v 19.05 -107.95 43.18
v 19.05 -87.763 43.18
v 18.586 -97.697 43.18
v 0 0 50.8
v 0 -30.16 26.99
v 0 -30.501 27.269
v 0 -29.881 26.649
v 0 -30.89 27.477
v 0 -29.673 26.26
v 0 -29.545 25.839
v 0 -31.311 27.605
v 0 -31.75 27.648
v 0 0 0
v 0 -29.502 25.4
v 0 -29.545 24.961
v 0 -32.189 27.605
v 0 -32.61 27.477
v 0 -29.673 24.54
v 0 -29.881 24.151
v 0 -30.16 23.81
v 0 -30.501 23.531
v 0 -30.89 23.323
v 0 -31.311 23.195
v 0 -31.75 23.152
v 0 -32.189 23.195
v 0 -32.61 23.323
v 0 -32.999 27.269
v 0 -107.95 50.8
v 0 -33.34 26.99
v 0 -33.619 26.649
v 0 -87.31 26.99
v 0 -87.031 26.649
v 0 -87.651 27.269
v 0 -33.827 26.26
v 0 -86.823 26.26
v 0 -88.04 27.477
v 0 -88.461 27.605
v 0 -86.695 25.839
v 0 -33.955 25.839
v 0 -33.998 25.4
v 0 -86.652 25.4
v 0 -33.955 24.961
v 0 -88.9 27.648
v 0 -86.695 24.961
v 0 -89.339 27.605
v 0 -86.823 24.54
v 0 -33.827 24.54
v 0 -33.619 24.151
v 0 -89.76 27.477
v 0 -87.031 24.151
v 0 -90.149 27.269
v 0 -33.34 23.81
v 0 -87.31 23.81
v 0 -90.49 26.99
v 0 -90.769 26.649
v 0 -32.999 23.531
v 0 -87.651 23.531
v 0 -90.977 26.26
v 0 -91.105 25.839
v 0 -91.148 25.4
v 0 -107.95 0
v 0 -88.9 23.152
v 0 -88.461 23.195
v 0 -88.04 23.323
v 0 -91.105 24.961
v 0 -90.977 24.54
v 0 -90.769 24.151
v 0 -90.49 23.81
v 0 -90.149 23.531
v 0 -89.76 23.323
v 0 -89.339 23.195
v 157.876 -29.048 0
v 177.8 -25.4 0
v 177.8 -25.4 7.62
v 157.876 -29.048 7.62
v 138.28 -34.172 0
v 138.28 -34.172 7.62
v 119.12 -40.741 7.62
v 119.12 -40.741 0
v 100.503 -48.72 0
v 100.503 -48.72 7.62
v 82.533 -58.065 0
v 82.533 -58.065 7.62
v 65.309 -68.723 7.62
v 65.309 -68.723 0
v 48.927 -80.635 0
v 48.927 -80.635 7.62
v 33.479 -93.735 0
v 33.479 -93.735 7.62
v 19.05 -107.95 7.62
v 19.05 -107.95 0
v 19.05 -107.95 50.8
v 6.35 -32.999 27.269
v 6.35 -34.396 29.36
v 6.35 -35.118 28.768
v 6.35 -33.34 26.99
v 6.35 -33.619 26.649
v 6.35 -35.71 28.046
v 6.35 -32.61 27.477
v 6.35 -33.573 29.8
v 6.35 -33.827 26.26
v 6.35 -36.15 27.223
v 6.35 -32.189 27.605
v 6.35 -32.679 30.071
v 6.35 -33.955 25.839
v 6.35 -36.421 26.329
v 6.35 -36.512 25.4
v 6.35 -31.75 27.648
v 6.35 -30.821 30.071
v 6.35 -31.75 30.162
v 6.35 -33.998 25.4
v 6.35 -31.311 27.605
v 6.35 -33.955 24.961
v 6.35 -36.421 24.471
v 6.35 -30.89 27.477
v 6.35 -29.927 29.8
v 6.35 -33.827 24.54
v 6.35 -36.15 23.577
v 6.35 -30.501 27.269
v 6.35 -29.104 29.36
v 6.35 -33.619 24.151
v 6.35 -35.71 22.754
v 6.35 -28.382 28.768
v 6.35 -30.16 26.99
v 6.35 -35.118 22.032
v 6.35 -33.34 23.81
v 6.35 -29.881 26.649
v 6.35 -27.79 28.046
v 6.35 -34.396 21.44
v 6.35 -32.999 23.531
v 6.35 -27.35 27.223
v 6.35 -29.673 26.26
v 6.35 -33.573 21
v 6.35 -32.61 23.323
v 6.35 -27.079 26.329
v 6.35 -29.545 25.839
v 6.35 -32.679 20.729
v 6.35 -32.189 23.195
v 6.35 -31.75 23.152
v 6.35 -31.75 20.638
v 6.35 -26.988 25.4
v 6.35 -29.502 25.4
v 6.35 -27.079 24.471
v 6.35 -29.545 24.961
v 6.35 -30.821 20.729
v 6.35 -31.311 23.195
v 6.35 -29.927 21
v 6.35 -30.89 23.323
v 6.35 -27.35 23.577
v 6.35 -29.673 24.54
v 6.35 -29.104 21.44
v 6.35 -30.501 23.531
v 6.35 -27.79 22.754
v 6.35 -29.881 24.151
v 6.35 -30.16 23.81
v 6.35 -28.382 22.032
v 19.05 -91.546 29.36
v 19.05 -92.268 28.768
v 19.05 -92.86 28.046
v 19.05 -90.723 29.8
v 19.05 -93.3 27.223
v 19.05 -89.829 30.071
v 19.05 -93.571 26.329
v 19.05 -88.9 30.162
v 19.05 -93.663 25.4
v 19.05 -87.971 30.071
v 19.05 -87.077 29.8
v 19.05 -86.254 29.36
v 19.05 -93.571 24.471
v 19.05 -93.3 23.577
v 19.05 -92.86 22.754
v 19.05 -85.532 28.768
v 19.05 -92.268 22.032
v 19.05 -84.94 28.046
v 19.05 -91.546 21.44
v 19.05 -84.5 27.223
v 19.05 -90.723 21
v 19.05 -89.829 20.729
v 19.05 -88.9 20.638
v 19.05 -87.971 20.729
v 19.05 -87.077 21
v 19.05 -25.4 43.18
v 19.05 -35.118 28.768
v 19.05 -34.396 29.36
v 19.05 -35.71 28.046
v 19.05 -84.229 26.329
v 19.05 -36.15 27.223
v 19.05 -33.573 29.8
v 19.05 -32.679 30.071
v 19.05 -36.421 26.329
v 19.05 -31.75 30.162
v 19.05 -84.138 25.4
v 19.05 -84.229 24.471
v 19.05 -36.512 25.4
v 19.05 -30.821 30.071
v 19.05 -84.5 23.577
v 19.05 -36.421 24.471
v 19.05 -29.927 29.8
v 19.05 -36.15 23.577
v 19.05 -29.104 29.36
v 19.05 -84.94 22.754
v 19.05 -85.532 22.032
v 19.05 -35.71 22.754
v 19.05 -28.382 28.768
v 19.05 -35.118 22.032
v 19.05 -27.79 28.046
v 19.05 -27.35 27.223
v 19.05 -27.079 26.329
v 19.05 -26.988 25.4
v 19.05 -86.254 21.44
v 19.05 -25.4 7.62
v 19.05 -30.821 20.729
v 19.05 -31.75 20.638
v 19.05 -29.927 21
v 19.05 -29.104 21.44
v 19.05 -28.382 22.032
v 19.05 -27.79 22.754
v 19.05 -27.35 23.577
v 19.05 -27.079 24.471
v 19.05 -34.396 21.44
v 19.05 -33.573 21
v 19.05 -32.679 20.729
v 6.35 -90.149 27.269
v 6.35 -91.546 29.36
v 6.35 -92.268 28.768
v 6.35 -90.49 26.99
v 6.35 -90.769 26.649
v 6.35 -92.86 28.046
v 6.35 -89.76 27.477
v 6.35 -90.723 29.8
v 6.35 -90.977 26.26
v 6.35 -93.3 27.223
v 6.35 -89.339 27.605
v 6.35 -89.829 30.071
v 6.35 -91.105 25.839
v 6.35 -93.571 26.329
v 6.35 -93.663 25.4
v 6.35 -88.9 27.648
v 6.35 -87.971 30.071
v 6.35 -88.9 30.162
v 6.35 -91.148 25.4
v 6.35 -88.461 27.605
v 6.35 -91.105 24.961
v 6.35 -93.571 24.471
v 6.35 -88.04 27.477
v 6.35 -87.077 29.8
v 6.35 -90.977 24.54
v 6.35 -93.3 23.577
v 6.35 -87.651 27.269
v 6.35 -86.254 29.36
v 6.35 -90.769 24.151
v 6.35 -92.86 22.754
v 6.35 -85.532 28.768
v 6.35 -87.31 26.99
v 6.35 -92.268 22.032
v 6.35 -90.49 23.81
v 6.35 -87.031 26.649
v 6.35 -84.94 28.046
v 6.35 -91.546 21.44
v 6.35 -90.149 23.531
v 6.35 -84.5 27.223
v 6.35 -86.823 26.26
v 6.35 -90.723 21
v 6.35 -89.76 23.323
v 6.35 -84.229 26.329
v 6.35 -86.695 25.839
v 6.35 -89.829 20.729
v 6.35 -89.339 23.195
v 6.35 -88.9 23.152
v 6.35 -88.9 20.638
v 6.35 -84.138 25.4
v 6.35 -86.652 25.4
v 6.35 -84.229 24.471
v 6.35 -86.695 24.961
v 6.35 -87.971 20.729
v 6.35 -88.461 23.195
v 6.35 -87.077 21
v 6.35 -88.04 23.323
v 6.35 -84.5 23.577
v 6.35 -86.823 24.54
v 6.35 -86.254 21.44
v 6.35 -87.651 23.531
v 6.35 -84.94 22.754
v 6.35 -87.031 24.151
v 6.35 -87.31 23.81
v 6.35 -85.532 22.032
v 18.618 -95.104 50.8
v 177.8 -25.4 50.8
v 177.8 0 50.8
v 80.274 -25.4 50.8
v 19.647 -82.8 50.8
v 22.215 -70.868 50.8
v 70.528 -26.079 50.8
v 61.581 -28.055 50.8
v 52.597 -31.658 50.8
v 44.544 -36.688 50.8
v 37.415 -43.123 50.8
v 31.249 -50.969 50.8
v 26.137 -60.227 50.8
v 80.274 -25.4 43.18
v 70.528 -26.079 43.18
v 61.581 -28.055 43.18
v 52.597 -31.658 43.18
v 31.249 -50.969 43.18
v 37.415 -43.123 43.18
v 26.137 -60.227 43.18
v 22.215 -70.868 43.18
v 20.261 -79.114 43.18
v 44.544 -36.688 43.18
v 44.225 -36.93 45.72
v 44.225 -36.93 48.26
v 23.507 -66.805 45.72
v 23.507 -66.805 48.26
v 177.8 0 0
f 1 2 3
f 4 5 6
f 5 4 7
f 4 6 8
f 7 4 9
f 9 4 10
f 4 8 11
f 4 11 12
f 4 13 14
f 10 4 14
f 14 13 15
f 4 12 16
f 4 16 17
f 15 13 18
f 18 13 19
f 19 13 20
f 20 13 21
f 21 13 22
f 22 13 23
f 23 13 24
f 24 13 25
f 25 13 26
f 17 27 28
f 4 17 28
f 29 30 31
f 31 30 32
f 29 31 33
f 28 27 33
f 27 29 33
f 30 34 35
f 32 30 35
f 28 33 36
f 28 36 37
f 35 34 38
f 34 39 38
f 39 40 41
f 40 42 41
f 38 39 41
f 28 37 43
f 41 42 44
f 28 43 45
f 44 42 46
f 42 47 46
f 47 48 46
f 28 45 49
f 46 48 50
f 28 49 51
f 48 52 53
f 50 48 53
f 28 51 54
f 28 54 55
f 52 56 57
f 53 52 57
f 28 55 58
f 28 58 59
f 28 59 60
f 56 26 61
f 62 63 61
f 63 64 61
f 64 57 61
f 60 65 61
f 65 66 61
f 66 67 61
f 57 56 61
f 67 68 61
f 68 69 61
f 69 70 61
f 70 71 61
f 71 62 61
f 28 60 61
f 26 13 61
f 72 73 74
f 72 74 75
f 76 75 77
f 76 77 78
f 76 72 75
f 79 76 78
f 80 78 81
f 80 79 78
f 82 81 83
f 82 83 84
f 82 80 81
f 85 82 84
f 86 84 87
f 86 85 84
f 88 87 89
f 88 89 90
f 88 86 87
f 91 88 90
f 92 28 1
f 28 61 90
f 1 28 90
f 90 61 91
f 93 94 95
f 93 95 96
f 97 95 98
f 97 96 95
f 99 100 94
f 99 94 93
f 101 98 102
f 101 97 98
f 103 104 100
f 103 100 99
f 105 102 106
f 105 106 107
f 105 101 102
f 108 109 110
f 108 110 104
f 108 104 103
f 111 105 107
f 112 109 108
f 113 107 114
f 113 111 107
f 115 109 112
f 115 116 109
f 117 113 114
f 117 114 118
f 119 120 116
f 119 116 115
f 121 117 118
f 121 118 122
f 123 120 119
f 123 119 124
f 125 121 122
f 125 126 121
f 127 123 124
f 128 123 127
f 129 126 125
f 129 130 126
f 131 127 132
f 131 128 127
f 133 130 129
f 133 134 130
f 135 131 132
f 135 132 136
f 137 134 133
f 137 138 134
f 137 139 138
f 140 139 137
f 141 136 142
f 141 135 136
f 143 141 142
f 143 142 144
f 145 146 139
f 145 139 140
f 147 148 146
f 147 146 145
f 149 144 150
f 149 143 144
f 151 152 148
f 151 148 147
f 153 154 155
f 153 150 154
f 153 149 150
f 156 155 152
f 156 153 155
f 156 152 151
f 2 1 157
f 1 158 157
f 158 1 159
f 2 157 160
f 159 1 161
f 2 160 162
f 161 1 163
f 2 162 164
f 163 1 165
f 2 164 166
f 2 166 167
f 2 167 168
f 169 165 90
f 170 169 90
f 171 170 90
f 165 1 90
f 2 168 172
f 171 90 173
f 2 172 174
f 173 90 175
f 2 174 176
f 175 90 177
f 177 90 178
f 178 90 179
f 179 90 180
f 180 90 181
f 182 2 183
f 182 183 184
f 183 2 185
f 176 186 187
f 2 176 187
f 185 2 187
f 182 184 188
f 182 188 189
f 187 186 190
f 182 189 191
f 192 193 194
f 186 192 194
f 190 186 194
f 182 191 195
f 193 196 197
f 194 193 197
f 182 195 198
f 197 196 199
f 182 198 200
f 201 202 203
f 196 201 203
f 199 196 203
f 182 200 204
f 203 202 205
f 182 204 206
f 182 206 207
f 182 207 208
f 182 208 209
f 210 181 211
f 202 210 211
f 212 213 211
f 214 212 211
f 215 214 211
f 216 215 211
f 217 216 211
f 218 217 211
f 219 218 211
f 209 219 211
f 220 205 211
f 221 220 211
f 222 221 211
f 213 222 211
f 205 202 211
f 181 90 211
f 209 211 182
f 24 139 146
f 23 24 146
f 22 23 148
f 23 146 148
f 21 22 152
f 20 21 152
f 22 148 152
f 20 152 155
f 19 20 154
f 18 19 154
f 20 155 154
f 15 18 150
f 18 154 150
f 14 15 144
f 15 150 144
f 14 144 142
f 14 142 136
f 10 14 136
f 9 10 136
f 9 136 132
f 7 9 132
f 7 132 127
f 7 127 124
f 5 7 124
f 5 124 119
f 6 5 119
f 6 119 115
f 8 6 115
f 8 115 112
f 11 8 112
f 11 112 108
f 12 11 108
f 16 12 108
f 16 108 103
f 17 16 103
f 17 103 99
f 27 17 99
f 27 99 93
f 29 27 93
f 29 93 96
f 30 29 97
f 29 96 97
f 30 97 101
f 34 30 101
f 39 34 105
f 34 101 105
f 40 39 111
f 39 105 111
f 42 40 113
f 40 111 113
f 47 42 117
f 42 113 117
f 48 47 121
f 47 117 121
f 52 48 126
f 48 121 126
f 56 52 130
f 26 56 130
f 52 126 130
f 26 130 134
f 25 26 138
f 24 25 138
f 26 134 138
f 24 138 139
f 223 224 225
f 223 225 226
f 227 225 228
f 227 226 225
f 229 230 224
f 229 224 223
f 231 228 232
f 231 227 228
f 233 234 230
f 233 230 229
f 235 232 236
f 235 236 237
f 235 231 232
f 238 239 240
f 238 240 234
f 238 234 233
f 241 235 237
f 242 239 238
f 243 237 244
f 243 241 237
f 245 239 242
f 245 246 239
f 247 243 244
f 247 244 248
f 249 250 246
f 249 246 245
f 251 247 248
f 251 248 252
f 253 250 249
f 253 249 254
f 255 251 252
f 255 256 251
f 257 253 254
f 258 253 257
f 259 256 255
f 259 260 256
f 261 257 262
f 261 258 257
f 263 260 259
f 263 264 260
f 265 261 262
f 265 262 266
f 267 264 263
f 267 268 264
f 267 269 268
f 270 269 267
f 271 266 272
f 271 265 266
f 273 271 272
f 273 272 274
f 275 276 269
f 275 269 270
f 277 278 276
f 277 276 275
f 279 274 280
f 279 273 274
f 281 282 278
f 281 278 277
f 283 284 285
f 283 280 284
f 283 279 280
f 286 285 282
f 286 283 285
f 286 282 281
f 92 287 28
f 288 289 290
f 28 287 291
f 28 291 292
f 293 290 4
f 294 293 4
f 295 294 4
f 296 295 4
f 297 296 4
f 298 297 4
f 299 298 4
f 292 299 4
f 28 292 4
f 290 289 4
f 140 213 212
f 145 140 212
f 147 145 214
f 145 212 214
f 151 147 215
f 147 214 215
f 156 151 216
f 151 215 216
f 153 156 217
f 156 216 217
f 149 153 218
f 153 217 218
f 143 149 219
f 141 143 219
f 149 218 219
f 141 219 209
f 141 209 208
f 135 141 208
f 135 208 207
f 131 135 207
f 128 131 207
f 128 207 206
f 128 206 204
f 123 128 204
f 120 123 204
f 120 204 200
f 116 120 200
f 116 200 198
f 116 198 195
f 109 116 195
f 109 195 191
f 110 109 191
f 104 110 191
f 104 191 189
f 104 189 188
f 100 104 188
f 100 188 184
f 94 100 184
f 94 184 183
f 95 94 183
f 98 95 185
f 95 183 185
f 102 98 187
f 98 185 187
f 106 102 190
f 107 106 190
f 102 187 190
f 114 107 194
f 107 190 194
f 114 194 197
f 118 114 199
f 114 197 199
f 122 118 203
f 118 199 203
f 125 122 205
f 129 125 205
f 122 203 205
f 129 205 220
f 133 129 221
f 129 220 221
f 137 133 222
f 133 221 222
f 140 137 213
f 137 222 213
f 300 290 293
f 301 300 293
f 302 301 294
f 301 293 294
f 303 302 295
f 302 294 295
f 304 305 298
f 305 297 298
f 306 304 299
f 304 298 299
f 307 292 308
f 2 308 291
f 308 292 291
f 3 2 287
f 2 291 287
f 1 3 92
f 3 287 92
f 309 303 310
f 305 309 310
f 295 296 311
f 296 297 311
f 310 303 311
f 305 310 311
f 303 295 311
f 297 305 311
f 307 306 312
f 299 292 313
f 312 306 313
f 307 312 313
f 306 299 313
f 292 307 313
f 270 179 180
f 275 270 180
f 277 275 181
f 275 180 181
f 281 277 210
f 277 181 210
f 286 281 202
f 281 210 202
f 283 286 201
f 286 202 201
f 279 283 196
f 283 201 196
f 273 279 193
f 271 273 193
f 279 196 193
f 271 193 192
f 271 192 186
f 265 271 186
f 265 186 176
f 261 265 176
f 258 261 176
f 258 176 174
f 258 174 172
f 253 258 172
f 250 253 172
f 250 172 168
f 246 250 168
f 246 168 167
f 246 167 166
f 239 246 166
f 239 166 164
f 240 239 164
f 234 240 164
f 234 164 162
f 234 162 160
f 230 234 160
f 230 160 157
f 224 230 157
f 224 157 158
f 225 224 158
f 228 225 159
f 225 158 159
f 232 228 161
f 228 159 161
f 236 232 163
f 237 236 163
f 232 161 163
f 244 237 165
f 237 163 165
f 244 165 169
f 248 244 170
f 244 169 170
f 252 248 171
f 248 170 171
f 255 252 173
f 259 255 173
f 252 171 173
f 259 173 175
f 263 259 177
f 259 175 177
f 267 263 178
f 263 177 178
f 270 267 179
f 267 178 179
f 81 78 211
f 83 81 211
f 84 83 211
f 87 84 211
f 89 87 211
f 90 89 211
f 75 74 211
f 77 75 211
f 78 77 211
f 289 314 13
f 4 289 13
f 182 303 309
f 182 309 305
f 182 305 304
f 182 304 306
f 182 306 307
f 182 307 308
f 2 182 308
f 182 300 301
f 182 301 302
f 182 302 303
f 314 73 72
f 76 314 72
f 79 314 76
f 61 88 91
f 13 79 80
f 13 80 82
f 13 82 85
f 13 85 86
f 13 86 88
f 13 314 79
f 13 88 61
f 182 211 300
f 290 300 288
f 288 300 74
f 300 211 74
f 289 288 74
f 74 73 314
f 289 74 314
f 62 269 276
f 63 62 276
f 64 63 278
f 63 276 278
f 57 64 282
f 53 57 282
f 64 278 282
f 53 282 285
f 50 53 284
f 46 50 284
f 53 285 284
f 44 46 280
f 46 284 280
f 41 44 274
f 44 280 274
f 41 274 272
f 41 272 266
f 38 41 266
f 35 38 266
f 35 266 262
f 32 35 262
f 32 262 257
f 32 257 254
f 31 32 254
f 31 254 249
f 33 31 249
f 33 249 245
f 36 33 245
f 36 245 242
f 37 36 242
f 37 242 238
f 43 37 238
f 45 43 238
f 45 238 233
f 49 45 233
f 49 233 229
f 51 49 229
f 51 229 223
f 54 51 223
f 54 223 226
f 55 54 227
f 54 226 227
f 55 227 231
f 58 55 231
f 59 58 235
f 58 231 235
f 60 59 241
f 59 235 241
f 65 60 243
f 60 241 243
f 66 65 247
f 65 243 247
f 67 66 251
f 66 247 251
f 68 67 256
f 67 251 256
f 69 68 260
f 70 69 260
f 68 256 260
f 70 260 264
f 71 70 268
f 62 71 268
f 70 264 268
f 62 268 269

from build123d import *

# Parameters (mm, degrees)
BOSS_EXTRUDE1_DEPTH                                 = 50.8
F_8_CLEARANCE_HOLE1_D                               = 4.4958
CBORE_FOR_8_BINDING_HEAD_MACHINE_SCREW1_D           = 4.4958
CBORE_FOR_8_BINDING_HEAD_MACHINE_SCREW1_CBORE_D     = 9.525
CBORE_FOR_8_BINDING_HEAD_MACHINE_SCREW1_CBORE_DEPTH = 12.7
BOSS_EXTRUDE2_DEPTH                                 = 7.62
CUT_EXTRUDE1_DEPTH                                  = 7.62


with BuildPart() as part:
    # Sketch1 → Boss-Extrude1 (new body)
    with BuildSketch(Plane.XY):
        Polygon((0, 0), (0, -107.95), (19.05, -107.95), (19.05, -25.4), (177.8, -25.4), (177.8, 0), align=None)
    extrude(amount=BOSS_EXTRUDE1_DEPTH)

    # #8 Clearance Hole1 (through all)
    with Locations(Plane.ZY):
        with Locations((25.4, -31.75), (25.4, -88.9)):
            Hole(F_8_CLEARANCE_HOLE1_D / 2)

    # CBORE for #8 Binding Head Machine Screw1 (through all)
    with Locations(Plane(origin=(19.05, 0, 0), x_dir=(0, 0, -1), z_dir=(1, 0, 0))):
        with Locations((-25.4, -31.75), (-25.4, -88.9)):
            CounterBoreHole(CBORE_FOR_8_BINDING_HEAD_MACHINE_SCREW1_D / 2, CBORE_FOR_8_BINDING_HEAD_MACHINE_SCREW1_CBORE_D / 2, CBORE_FOR_8_BINDING_HEAD_MACHINE_SCREW1_CBORE_DEPTH)

    # Sketch7 → Boss-Extrude2 (add)
    with BuildSketch(Plane.XY.offset(50.8)):
        with BuildLine():
            Line((19.05, -107.95), (19.05, -25.4))
            Line((19.05, -25.4), (177.8, -25.4))
            ThreePointArc((177.8, -25.4), (91.430997476, -53.224995146), (19.05, -107.95))
        make_face()
    boss_extrude2 = extrude(amount=-BOSS_EXTRUDE2_DEPTH)

    # Mirror1: Boss-Extrude2 across plane
    add(boss_extrude2.mirror(Plane(origin=(0, 0, 25.4), x_dir=(1, 0, 0), z_dir=(0, 0, -1))))

    # Sketch8 → Cut-Extrude1 (cut)
    with BuildSketch(Plane.XY.offset(50.8)):
        with BuildLine():
            Line((177.8, -25.4), (80.273648103, -25.4))
            add(Edge.make_bspline(
                [(80.273648103, -25.4), (36.871479527, -25.4), (15.065136677, -63.527261514), (19.05, -107.95)],
                knots=[0, 0, 0, 0, 1, 1, 1, 1], degree=3))
            Line((19.05, -107.95), (177.8, -25.4))
        make_face()
    extrude(amount=-CUT_EXTRUDE1_DEPTH, mode=Mode.SUBTRACT)


solid = part.part
